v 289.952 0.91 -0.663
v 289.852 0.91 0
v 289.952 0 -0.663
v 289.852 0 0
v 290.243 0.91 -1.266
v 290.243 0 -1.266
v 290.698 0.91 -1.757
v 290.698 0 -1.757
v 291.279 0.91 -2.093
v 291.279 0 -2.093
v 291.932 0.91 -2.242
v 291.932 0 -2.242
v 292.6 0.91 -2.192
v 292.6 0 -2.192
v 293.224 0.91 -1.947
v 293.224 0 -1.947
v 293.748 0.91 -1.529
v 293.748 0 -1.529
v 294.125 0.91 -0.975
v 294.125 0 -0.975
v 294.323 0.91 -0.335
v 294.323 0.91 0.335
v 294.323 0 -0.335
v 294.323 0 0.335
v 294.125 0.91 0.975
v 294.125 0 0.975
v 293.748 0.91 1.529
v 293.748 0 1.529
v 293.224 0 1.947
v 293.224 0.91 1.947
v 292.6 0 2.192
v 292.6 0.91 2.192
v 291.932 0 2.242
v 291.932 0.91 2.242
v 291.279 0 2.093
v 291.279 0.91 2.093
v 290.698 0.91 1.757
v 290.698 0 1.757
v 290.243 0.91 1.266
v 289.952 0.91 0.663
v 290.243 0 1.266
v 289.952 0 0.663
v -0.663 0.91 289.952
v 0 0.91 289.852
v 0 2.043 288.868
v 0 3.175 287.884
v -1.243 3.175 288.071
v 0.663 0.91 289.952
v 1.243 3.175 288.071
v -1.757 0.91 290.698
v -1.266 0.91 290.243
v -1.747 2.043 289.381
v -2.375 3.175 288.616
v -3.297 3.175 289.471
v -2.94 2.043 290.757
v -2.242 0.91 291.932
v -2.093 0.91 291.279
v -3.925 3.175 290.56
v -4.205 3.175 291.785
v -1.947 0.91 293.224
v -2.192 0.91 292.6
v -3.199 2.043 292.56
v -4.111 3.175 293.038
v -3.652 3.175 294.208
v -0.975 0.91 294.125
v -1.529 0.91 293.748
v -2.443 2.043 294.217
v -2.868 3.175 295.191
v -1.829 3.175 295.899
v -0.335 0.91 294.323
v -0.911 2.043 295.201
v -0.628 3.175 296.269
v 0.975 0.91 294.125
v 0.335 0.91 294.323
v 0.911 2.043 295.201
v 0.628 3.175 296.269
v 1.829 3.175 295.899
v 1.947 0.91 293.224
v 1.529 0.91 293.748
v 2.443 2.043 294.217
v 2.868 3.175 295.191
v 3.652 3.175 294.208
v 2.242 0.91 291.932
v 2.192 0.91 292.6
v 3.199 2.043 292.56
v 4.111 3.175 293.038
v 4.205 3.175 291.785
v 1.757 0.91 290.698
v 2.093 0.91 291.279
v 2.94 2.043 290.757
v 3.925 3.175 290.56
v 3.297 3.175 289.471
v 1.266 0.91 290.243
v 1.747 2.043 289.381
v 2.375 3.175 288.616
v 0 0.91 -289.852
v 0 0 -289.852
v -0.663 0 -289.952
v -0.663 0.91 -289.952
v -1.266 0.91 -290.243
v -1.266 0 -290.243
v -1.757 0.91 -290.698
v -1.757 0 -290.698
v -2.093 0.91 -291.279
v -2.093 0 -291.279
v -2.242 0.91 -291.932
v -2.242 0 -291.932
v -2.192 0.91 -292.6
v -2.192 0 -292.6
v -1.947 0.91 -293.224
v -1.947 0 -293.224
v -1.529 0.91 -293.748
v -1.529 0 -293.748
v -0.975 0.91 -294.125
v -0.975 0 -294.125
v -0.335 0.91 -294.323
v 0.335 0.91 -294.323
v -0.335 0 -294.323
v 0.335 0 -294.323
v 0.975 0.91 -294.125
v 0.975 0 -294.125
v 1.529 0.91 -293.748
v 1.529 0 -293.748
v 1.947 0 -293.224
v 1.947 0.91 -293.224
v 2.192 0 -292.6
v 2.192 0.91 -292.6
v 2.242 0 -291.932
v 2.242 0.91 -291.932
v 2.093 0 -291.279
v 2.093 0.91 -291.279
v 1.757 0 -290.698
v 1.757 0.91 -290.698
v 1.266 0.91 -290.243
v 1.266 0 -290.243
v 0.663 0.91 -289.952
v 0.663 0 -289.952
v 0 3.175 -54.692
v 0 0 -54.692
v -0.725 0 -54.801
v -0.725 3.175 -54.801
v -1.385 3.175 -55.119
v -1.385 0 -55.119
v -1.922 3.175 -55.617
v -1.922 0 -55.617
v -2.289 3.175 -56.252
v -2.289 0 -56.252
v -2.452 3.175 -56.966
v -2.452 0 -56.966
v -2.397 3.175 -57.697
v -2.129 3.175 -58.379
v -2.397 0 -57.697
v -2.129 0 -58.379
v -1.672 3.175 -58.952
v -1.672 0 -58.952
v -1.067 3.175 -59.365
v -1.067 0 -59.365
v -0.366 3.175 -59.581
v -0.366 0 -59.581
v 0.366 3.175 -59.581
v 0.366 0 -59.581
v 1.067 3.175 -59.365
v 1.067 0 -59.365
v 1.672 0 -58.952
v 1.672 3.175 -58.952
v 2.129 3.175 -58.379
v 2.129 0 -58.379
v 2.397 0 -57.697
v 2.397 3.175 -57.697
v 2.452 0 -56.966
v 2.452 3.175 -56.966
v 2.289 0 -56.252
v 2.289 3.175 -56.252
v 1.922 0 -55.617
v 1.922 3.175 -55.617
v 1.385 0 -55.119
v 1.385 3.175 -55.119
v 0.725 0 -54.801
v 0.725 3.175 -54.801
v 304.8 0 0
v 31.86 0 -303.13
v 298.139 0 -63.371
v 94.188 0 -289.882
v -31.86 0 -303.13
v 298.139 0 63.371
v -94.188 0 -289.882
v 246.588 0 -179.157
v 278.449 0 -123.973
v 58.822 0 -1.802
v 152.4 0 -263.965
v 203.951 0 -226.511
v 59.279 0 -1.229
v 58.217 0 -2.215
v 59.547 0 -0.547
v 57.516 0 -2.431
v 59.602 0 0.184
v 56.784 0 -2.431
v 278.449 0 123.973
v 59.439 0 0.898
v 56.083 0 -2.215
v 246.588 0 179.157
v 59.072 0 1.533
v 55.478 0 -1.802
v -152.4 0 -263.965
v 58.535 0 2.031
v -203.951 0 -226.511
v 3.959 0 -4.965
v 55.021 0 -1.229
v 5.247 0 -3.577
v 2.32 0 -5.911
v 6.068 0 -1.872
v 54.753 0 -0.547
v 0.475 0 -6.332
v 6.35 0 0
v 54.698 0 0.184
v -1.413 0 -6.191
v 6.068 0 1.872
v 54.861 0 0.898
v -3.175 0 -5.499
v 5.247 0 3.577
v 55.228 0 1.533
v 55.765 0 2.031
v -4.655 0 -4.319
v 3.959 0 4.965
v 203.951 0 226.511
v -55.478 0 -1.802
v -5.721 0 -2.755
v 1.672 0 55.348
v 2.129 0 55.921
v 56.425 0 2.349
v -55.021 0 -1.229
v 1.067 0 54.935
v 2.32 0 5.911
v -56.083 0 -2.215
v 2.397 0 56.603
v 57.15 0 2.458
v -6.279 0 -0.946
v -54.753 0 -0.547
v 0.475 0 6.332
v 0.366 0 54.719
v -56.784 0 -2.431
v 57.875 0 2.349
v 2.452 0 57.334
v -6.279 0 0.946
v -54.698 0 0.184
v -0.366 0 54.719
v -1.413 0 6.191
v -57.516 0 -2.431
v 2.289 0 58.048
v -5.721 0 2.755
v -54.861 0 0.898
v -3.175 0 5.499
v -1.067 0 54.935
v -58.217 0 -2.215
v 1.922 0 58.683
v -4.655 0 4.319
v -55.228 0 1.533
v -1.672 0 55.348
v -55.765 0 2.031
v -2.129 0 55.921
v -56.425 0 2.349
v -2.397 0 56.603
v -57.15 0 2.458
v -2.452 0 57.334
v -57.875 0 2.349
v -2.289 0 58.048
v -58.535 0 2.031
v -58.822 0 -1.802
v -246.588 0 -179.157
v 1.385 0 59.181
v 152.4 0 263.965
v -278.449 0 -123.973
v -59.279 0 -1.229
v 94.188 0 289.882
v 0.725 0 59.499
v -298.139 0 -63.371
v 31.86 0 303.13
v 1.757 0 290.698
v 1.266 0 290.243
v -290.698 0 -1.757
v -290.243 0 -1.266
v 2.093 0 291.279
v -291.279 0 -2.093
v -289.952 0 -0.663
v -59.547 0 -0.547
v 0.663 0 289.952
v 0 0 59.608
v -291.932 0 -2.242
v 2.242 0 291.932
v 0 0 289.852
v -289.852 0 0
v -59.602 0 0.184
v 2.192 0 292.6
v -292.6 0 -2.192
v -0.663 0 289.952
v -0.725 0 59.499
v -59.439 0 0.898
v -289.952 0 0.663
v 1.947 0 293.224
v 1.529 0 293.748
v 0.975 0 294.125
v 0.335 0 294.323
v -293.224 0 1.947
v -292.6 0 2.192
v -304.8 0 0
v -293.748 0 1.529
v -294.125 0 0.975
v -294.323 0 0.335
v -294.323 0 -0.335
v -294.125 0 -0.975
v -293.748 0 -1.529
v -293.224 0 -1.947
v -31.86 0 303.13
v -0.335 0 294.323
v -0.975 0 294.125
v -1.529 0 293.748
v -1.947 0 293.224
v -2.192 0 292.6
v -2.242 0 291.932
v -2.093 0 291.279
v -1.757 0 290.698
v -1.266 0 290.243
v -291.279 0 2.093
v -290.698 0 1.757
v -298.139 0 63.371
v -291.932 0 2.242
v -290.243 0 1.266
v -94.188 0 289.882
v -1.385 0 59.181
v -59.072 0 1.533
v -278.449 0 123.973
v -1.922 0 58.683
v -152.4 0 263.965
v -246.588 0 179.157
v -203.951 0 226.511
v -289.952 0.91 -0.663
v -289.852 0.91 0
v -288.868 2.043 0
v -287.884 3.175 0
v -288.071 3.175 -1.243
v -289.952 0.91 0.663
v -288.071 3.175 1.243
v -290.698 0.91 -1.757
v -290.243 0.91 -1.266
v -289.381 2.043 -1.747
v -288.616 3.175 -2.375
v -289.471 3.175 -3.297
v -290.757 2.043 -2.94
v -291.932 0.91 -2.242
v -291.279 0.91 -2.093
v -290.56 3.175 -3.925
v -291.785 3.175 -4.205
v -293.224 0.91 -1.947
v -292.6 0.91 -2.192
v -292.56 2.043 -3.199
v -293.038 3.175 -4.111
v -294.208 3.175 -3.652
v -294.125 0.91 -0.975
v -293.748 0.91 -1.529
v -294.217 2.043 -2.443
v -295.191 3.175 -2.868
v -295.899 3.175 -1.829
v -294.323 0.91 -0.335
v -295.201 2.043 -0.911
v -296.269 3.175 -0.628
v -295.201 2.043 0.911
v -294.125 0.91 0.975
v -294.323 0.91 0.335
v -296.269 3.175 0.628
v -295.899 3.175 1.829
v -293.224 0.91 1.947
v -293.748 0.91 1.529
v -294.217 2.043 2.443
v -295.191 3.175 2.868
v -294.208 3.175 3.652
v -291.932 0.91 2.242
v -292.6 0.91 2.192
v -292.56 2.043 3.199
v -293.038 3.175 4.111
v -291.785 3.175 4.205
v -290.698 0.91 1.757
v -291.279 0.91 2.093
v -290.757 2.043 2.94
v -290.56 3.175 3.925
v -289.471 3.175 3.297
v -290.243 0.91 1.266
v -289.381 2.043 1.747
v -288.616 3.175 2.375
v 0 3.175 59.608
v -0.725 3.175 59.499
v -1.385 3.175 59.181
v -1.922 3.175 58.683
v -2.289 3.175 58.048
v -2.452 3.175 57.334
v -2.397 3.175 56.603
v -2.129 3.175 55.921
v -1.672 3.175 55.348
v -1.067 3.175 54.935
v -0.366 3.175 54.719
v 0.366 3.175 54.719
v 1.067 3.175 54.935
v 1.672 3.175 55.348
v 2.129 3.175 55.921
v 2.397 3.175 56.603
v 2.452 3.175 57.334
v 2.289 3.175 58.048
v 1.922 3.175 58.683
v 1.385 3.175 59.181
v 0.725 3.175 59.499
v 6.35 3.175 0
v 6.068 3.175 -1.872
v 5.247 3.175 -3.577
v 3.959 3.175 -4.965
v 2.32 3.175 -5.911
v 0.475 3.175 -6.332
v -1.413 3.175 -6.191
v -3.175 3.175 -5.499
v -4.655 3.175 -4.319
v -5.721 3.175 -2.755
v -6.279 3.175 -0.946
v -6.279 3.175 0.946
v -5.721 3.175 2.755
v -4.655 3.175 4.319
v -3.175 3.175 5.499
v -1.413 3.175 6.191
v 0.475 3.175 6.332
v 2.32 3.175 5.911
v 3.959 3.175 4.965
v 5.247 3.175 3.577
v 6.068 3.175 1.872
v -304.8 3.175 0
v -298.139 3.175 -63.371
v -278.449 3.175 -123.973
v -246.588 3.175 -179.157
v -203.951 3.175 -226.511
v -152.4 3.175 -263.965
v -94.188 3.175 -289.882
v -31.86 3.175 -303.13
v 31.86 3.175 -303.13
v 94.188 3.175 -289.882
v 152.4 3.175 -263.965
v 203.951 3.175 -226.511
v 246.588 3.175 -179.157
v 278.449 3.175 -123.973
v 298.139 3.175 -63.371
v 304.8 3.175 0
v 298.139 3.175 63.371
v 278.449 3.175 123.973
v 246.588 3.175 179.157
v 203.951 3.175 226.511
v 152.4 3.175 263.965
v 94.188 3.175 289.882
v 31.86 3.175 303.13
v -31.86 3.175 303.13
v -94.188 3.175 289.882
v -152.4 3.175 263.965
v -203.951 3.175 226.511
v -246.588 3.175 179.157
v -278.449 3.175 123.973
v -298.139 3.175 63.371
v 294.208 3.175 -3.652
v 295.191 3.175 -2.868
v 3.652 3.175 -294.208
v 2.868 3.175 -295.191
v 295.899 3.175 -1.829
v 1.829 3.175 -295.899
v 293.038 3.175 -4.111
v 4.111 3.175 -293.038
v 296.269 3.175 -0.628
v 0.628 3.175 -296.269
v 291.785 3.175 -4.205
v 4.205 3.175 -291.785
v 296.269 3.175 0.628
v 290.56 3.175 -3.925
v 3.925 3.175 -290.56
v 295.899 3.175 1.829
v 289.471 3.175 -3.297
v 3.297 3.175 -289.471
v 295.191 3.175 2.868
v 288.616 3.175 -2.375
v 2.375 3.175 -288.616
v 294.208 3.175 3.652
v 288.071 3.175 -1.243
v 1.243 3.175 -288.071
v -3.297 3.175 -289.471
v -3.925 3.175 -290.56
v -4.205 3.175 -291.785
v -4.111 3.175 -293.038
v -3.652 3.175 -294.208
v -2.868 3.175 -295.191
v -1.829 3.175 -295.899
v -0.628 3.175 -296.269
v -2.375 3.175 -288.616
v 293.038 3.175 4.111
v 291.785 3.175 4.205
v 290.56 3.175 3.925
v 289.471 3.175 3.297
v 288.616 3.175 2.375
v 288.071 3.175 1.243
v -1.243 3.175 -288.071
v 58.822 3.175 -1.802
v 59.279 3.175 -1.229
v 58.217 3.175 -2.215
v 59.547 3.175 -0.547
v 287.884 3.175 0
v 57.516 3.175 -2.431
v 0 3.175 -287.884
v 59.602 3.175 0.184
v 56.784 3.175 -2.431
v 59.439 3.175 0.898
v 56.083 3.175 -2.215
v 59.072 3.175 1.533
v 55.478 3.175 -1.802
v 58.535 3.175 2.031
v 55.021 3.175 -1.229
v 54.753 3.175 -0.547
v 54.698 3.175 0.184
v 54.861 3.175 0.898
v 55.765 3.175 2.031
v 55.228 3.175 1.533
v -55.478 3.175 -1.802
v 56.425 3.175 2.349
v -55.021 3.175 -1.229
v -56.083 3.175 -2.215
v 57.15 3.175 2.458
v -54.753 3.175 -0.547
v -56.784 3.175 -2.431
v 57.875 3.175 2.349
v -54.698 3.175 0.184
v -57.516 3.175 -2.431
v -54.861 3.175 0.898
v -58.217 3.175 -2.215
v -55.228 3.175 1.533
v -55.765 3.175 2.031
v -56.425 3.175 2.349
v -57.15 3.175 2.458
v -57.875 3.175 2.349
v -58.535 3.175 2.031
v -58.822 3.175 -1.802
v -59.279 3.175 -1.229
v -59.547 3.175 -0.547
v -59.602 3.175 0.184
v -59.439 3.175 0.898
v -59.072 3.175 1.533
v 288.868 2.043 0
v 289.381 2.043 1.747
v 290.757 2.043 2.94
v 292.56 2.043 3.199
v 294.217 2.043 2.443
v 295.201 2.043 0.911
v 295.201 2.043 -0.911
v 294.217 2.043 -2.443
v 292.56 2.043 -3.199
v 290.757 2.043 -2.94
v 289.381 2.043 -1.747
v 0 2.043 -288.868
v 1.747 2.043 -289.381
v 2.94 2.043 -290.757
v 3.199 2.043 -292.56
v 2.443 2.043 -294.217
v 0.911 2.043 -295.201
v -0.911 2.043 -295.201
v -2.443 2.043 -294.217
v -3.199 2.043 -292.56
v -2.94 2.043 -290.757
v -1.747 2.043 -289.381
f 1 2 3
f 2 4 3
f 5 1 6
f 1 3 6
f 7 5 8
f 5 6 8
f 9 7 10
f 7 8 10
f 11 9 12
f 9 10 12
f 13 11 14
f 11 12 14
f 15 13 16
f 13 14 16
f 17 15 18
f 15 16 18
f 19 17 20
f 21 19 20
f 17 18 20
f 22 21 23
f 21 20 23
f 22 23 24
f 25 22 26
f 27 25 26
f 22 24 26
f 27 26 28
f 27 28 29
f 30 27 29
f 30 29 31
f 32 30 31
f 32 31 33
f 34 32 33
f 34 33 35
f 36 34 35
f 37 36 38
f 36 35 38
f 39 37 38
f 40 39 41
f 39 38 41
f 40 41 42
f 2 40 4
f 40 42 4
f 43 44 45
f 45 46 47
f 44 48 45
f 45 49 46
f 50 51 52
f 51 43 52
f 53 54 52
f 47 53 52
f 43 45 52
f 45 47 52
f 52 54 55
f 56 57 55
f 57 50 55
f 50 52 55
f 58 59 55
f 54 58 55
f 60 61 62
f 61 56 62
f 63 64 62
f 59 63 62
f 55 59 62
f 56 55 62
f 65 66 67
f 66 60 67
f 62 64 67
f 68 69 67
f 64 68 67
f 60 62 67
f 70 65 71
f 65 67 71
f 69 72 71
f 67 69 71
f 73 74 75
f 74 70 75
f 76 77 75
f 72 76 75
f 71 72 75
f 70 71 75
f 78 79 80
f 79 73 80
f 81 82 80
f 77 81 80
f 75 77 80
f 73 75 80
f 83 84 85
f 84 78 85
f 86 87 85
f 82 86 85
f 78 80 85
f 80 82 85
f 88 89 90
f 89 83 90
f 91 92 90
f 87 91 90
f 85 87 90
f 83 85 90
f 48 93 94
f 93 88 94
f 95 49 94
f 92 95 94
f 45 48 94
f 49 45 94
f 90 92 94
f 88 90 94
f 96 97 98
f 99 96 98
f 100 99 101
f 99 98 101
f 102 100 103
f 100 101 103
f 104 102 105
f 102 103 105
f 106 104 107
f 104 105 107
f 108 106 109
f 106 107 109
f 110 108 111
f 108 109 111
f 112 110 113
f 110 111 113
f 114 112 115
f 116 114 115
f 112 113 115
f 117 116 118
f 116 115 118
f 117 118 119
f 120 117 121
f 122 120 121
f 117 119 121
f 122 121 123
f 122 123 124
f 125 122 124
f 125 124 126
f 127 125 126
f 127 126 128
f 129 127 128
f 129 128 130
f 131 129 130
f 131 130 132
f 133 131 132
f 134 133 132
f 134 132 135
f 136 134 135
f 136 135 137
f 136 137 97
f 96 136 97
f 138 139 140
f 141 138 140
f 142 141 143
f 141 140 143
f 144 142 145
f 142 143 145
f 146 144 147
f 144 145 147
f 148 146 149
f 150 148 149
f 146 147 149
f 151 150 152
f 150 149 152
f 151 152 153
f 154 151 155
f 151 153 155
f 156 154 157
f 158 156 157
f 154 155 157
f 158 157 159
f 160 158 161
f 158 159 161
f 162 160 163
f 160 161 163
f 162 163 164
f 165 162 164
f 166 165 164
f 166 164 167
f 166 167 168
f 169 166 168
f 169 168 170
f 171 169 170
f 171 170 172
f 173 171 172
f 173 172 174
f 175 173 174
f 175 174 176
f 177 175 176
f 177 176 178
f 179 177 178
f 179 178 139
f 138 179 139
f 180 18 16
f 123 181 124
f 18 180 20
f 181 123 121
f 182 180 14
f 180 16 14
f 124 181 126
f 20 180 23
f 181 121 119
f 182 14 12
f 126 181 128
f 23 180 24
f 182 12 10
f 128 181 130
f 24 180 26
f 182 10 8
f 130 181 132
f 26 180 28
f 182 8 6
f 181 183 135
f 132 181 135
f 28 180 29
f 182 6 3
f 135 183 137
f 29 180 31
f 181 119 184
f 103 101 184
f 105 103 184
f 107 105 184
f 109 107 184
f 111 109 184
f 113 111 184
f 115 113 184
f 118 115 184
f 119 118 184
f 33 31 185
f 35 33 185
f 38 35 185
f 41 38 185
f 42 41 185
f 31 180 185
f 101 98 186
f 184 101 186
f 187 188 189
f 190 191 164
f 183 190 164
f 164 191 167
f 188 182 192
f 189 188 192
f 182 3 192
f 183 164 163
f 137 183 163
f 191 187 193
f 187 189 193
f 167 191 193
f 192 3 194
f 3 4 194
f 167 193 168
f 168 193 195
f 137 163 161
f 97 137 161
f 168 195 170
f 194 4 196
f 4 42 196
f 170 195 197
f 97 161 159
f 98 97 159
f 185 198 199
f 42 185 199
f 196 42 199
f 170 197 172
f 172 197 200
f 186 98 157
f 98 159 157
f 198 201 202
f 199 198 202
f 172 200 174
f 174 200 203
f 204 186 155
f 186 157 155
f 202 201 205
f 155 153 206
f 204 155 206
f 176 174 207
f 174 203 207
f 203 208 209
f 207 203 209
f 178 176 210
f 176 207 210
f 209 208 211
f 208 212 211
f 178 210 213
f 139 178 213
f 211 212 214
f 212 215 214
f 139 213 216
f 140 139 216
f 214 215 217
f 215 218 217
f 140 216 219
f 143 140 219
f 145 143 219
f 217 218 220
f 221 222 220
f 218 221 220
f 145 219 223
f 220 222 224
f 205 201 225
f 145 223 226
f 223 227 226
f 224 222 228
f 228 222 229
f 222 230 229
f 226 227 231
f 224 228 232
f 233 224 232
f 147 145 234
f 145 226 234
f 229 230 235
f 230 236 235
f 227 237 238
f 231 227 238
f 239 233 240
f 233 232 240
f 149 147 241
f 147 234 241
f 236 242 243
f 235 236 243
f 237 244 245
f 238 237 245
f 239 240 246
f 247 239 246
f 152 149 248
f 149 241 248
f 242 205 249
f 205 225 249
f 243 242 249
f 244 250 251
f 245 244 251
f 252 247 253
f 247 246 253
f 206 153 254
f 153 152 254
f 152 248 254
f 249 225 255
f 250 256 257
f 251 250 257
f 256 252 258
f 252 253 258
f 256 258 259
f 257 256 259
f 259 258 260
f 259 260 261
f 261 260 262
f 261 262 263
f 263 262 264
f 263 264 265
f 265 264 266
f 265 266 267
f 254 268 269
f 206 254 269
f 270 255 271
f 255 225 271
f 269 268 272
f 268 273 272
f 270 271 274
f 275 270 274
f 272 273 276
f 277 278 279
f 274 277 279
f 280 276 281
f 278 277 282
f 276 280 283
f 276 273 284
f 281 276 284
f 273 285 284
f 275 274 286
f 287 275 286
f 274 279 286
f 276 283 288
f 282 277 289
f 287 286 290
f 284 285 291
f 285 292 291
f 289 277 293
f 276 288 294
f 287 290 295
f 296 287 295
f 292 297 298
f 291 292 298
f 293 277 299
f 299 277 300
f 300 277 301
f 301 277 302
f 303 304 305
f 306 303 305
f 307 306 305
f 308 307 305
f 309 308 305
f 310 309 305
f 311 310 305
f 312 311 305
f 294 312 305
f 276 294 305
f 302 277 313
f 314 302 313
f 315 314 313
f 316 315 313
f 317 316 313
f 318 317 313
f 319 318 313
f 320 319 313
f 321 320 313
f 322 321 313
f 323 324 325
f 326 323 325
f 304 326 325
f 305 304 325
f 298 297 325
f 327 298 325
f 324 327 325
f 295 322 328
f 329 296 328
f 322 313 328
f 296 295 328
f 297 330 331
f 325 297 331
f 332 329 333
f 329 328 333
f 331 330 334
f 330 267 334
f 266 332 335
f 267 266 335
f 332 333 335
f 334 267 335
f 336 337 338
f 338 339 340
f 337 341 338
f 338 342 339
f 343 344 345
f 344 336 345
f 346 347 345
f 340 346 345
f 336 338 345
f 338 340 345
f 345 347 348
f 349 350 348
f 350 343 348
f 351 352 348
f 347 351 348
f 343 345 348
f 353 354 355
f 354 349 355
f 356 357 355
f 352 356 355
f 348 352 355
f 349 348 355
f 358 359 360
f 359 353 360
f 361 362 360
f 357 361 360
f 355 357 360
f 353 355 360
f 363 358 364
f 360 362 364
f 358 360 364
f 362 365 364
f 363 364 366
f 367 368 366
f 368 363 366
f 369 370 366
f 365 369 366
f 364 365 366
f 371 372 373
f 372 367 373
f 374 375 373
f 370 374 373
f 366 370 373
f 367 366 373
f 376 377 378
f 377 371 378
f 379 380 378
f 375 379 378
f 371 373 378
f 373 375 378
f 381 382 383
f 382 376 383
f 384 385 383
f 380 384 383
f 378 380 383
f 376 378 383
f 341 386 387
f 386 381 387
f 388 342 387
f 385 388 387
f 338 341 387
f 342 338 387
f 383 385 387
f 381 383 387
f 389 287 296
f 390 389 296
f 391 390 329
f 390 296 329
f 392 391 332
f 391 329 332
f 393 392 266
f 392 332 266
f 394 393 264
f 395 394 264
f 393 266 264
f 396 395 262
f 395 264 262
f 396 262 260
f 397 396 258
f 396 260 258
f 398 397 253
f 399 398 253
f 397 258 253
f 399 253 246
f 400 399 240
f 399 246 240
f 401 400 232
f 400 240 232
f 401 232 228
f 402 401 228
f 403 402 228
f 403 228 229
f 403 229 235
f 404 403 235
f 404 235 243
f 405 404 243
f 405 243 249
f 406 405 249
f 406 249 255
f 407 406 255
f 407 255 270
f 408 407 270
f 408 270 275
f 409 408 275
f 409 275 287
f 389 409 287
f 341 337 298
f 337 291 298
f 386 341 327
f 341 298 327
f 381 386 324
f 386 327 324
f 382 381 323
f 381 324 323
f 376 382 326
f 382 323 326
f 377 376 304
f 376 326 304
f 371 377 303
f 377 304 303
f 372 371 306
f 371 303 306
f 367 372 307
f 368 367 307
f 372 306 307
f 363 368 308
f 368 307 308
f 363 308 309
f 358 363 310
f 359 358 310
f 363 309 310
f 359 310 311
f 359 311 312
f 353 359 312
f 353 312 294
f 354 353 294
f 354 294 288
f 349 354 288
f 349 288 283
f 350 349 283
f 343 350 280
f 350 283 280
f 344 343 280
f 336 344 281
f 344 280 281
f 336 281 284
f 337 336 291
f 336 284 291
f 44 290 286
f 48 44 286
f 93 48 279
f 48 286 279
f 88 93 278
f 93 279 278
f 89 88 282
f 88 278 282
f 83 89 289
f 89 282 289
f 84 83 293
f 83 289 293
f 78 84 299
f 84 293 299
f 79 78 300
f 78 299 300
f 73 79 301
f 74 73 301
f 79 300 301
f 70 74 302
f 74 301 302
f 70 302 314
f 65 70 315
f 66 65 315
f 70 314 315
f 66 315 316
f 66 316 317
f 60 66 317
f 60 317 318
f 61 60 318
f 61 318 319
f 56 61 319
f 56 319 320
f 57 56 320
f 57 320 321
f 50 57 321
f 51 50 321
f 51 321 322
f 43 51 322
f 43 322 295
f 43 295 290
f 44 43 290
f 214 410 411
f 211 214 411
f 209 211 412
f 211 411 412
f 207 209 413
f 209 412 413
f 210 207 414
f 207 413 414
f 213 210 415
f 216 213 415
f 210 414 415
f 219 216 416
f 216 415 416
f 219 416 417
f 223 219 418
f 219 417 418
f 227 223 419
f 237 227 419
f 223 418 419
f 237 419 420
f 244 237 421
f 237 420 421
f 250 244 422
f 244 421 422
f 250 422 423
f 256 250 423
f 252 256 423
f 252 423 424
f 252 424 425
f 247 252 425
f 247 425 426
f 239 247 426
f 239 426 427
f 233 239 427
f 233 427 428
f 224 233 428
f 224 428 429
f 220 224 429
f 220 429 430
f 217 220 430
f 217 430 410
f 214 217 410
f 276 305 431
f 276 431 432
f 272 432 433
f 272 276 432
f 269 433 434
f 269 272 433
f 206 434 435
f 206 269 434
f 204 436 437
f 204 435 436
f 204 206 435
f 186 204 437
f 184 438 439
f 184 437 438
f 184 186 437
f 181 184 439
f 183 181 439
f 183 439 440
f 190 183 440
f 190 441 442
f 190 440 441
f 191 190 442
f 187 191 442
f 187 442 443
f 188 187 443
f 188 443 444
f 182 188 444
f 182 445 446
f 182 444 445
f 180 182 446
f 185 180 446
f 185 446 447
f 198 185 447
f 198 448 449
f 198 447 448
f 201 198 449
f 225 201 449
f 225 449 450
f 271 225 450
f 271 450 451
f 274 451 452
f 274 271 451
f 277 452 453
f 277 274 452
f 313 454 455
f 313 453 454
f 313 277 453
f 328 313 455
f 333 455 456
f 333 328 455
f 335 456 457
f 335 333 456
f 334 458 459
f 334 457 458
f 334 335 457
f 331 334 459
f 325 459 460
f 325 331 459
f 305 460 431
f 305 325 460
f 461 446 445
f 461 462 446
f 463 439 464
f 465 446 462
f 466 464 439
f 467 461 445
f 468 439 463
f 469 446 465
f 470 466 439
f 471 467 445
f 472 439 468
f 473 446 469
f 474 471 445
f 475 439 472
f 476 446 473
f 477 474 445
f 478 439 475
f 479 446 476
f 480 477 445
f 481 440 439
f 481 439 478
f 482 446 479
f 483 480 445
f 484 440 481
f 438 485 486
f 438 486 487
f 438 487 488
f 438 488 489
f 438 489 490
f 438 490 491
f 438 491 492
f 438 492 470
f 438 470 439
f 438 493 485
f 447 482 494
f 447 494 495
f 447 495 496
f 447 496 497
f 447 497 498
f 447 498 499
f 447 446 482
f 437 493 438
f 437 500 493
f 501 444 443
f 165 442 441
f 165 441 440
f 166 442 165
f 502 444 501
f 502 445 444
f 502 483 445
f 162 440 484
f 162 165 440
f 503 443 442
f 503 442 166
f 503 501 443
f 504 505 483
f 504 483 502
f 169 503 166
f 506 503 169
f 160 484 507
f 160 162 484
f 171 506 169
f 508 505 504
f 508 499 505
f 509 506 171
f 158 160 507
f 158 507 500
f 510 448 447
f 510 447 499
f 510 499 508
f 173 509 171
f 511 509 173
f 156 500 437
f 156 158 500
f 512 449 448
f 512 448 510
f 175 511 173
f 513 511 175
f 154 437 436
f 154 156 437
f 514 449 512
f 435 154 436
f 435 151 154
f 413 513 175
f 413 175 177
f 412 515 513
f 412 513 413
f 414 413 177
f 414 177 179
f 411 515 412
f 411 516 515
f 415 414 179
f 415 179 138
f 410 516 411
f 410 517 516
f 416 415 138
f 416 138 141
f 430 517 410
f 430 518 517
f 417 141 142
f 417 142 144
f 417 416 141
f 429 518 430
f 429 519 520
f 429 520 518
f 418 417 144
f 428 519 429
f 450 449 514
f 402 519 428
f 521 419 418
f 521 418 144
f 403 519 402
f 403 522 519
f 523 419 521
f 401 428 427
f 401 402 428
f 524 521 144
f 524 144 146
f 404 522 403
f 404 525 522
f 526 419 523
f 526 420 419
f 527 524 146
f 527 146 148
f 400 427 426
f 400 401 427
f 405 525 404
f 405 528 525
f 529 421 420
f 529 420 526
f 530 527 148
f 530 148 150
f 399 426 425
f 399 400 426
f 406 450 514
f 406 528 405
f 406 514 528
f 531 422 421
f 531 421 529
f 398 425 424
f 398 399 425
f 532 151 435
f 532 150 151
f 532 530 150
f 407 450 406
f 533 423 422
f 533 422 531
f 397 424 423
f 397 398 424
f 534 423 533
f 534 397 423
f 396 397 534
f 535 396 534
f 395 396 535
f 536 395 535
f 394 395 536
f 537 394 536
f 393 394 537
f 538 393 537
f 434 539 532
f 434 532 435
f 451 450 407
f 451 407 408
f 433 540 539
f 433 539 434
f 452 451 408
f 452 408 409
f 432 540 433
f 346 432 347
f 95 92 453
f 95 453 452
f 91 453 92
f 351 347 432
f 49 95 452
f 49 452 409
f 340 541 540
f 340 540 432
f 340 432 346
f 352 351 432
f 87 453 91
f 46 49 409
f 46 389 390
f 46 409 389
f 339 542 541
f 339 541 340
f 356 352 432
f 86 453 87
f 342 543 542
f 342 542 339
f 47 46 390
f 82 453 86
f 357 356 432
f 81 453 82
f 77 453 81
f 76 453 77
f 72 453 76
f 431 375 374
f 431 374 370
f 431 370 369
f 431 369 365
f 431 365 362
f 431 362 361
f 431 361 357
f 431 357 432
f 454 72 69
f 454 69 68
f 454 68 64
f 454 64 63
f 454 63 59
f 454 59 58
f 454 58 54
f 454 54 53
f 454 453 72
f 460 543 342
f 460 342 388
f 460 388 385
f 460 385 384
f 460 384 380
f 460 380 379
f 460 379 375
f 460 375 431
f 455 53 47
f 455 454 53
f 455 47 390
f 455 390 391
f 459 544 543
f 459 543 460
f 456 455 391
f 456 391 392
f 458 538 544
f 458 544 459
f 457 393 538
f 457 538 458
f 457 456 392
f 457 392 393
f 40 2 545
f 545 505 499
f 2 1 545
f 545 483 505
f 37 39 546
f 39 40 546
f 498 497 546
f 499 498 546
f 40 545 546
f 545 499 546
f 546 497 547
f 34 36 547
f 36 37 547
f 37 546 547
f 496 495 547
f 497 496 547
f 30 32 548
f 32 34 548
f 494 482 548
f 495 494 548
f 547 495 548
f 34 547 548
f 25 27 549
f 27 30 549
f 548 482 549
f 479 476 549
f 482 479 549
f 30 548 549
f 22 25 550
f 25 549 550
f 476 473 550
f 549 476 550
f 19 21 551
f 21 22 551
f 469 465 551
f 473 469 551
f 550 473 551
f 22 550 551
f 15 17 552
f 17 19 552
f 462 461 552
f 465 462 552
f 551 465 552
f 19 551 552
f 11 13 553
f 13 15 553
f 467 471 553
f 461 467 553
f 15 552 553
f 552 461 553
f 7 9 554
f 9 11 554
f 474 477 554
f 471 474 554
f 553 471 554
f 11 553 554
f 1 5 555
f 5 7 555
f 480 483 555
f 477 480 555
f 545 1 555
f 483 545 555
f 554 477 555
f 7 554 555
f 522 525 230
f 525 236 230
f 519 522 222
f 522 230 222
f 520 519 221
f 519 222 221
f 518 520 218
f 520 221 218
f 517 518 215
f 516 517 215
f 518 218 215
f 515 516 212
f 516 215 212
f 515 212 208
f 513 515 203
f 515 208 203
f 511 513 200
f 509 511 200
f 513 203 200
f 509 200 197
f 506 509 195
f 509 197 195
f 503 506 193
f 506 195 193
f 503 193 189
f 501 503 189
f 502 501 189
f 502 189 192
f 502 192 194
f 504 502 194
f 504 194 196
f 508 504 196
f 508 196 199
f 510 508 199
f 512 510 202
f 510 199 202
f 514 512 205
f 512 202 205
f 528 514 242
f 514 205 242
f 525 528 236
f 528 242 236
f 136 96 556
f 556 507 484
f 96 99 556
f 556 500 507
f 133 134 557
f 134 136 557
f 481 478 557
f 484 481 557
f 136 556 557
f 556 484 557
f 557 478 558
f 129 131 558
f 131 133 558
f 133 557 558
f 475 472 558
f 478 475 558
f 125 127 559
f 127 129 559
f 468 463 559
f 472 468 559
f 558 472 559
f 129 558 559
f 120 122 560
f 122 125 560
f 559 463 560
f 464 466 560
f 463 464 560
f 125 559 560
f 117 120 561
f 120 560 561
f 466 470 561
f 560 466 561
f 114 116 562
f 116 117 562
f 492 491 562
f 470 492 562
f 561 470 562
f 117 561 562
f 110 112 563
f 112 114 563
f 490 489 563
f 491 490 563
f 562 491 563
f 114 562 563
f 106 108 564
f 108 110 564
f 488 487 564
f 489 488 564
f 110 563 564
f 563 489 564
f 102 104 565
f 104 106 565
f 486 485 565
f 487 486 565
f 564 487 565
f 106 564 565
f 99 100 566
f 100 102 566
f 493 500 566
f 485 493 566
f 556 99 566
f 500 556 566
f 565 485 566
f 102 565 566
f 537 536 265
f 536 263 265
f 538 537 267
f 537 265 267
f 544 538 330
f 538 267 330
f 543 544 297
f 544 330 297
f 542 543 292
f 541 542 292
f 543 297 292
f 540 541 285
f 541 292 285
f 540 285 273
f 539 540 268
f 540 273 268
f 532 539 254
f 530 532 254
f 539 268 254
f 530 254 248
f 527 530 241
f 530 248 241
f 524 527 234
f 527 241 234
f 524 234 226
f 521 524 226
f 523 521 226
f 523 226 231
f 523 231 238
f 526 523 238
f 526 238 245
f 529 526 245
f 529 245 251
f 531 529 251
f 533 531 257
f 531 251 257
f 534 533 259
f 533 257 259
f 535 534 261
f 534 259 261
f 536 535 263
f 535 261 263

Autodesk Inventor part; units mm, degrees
ref_plane "YZ Plane" through (0, 0, 0) normal (1, 0, 0) x (0, 1, 0)
ref_plane "XZ Plane" through (0, 0, 0) normal (0, 1, 0) x (-1, 0, 0)
ref_plane "XY Plane" through (0, 0, 0) normal (0, 0, 1) x (1, 0, 0)
sketch "Sketch1" plane through (0, 0, 0) normal (0, 1, 0) x (-1, 0, 0)
  circle A0 centre (0, 0) radius 304.8
  dimension "d0" = 609.6
extrude "Extrusion1" add sketch "Sketch1" along normal blind 3.175
sketch "Sketch2" plane through (0, 3.175, 0) normal (0, 1, 0) x (1, 0, 0)
  circle A0 centre (0, 0) radius 304.8 projected
  circle A1 centre (0, 0) radius 6.35
  dimension "d3" = 12.7
extrude "Extrusion2" cut sketch "Sketch2" against normal blind 3.175 contours A1
sketch "Sketch3" plane through (0, 3.175, 0) normal (0, 1, 0) x (1, 0, 0)
  circle A0 centre (0, 0) radius 6.35 projected
  circle A1 centre (0, 292.1) radius 4.6302
  dimension "d6" = 292.1
hole "Hole1" at (0, 3.175, -292.1) direction (0, -1, 0) diameter 4.4958 end through all countersink diameter 8.4328 countersink angle 82
pattern_circular "Circular Pattern1" count 4 over 360 about axis through (0, 3.175, 0) along (0, -1, 0) of "Hole1"
sketch "Sketch11" plane through (0, 3.175, 0) normal (0, 1, 0) x (1, 0, 0)
  circle A0 centre (0, 0) radius 57.15 construction
  point P0 (0, 57.15)
  point P1 (57.15, 0)
  point P2 (0, -57.15)
  point P3 (-57.15, 0)
  dimension "d98" = 114.3
hole "Hole8" at (0, 3.175, -57.15) at (57.15, 3.175, 0) at (0, 3.175, 57.15) at (-57.15, 3.175, 0) direction (0, -1, 0) diameter 4.917 end through all thread size "M6x1" class "6H" standard "ANSI Metric M Profile"
properties part number "2f1bd" material "Aluminum 6061"
